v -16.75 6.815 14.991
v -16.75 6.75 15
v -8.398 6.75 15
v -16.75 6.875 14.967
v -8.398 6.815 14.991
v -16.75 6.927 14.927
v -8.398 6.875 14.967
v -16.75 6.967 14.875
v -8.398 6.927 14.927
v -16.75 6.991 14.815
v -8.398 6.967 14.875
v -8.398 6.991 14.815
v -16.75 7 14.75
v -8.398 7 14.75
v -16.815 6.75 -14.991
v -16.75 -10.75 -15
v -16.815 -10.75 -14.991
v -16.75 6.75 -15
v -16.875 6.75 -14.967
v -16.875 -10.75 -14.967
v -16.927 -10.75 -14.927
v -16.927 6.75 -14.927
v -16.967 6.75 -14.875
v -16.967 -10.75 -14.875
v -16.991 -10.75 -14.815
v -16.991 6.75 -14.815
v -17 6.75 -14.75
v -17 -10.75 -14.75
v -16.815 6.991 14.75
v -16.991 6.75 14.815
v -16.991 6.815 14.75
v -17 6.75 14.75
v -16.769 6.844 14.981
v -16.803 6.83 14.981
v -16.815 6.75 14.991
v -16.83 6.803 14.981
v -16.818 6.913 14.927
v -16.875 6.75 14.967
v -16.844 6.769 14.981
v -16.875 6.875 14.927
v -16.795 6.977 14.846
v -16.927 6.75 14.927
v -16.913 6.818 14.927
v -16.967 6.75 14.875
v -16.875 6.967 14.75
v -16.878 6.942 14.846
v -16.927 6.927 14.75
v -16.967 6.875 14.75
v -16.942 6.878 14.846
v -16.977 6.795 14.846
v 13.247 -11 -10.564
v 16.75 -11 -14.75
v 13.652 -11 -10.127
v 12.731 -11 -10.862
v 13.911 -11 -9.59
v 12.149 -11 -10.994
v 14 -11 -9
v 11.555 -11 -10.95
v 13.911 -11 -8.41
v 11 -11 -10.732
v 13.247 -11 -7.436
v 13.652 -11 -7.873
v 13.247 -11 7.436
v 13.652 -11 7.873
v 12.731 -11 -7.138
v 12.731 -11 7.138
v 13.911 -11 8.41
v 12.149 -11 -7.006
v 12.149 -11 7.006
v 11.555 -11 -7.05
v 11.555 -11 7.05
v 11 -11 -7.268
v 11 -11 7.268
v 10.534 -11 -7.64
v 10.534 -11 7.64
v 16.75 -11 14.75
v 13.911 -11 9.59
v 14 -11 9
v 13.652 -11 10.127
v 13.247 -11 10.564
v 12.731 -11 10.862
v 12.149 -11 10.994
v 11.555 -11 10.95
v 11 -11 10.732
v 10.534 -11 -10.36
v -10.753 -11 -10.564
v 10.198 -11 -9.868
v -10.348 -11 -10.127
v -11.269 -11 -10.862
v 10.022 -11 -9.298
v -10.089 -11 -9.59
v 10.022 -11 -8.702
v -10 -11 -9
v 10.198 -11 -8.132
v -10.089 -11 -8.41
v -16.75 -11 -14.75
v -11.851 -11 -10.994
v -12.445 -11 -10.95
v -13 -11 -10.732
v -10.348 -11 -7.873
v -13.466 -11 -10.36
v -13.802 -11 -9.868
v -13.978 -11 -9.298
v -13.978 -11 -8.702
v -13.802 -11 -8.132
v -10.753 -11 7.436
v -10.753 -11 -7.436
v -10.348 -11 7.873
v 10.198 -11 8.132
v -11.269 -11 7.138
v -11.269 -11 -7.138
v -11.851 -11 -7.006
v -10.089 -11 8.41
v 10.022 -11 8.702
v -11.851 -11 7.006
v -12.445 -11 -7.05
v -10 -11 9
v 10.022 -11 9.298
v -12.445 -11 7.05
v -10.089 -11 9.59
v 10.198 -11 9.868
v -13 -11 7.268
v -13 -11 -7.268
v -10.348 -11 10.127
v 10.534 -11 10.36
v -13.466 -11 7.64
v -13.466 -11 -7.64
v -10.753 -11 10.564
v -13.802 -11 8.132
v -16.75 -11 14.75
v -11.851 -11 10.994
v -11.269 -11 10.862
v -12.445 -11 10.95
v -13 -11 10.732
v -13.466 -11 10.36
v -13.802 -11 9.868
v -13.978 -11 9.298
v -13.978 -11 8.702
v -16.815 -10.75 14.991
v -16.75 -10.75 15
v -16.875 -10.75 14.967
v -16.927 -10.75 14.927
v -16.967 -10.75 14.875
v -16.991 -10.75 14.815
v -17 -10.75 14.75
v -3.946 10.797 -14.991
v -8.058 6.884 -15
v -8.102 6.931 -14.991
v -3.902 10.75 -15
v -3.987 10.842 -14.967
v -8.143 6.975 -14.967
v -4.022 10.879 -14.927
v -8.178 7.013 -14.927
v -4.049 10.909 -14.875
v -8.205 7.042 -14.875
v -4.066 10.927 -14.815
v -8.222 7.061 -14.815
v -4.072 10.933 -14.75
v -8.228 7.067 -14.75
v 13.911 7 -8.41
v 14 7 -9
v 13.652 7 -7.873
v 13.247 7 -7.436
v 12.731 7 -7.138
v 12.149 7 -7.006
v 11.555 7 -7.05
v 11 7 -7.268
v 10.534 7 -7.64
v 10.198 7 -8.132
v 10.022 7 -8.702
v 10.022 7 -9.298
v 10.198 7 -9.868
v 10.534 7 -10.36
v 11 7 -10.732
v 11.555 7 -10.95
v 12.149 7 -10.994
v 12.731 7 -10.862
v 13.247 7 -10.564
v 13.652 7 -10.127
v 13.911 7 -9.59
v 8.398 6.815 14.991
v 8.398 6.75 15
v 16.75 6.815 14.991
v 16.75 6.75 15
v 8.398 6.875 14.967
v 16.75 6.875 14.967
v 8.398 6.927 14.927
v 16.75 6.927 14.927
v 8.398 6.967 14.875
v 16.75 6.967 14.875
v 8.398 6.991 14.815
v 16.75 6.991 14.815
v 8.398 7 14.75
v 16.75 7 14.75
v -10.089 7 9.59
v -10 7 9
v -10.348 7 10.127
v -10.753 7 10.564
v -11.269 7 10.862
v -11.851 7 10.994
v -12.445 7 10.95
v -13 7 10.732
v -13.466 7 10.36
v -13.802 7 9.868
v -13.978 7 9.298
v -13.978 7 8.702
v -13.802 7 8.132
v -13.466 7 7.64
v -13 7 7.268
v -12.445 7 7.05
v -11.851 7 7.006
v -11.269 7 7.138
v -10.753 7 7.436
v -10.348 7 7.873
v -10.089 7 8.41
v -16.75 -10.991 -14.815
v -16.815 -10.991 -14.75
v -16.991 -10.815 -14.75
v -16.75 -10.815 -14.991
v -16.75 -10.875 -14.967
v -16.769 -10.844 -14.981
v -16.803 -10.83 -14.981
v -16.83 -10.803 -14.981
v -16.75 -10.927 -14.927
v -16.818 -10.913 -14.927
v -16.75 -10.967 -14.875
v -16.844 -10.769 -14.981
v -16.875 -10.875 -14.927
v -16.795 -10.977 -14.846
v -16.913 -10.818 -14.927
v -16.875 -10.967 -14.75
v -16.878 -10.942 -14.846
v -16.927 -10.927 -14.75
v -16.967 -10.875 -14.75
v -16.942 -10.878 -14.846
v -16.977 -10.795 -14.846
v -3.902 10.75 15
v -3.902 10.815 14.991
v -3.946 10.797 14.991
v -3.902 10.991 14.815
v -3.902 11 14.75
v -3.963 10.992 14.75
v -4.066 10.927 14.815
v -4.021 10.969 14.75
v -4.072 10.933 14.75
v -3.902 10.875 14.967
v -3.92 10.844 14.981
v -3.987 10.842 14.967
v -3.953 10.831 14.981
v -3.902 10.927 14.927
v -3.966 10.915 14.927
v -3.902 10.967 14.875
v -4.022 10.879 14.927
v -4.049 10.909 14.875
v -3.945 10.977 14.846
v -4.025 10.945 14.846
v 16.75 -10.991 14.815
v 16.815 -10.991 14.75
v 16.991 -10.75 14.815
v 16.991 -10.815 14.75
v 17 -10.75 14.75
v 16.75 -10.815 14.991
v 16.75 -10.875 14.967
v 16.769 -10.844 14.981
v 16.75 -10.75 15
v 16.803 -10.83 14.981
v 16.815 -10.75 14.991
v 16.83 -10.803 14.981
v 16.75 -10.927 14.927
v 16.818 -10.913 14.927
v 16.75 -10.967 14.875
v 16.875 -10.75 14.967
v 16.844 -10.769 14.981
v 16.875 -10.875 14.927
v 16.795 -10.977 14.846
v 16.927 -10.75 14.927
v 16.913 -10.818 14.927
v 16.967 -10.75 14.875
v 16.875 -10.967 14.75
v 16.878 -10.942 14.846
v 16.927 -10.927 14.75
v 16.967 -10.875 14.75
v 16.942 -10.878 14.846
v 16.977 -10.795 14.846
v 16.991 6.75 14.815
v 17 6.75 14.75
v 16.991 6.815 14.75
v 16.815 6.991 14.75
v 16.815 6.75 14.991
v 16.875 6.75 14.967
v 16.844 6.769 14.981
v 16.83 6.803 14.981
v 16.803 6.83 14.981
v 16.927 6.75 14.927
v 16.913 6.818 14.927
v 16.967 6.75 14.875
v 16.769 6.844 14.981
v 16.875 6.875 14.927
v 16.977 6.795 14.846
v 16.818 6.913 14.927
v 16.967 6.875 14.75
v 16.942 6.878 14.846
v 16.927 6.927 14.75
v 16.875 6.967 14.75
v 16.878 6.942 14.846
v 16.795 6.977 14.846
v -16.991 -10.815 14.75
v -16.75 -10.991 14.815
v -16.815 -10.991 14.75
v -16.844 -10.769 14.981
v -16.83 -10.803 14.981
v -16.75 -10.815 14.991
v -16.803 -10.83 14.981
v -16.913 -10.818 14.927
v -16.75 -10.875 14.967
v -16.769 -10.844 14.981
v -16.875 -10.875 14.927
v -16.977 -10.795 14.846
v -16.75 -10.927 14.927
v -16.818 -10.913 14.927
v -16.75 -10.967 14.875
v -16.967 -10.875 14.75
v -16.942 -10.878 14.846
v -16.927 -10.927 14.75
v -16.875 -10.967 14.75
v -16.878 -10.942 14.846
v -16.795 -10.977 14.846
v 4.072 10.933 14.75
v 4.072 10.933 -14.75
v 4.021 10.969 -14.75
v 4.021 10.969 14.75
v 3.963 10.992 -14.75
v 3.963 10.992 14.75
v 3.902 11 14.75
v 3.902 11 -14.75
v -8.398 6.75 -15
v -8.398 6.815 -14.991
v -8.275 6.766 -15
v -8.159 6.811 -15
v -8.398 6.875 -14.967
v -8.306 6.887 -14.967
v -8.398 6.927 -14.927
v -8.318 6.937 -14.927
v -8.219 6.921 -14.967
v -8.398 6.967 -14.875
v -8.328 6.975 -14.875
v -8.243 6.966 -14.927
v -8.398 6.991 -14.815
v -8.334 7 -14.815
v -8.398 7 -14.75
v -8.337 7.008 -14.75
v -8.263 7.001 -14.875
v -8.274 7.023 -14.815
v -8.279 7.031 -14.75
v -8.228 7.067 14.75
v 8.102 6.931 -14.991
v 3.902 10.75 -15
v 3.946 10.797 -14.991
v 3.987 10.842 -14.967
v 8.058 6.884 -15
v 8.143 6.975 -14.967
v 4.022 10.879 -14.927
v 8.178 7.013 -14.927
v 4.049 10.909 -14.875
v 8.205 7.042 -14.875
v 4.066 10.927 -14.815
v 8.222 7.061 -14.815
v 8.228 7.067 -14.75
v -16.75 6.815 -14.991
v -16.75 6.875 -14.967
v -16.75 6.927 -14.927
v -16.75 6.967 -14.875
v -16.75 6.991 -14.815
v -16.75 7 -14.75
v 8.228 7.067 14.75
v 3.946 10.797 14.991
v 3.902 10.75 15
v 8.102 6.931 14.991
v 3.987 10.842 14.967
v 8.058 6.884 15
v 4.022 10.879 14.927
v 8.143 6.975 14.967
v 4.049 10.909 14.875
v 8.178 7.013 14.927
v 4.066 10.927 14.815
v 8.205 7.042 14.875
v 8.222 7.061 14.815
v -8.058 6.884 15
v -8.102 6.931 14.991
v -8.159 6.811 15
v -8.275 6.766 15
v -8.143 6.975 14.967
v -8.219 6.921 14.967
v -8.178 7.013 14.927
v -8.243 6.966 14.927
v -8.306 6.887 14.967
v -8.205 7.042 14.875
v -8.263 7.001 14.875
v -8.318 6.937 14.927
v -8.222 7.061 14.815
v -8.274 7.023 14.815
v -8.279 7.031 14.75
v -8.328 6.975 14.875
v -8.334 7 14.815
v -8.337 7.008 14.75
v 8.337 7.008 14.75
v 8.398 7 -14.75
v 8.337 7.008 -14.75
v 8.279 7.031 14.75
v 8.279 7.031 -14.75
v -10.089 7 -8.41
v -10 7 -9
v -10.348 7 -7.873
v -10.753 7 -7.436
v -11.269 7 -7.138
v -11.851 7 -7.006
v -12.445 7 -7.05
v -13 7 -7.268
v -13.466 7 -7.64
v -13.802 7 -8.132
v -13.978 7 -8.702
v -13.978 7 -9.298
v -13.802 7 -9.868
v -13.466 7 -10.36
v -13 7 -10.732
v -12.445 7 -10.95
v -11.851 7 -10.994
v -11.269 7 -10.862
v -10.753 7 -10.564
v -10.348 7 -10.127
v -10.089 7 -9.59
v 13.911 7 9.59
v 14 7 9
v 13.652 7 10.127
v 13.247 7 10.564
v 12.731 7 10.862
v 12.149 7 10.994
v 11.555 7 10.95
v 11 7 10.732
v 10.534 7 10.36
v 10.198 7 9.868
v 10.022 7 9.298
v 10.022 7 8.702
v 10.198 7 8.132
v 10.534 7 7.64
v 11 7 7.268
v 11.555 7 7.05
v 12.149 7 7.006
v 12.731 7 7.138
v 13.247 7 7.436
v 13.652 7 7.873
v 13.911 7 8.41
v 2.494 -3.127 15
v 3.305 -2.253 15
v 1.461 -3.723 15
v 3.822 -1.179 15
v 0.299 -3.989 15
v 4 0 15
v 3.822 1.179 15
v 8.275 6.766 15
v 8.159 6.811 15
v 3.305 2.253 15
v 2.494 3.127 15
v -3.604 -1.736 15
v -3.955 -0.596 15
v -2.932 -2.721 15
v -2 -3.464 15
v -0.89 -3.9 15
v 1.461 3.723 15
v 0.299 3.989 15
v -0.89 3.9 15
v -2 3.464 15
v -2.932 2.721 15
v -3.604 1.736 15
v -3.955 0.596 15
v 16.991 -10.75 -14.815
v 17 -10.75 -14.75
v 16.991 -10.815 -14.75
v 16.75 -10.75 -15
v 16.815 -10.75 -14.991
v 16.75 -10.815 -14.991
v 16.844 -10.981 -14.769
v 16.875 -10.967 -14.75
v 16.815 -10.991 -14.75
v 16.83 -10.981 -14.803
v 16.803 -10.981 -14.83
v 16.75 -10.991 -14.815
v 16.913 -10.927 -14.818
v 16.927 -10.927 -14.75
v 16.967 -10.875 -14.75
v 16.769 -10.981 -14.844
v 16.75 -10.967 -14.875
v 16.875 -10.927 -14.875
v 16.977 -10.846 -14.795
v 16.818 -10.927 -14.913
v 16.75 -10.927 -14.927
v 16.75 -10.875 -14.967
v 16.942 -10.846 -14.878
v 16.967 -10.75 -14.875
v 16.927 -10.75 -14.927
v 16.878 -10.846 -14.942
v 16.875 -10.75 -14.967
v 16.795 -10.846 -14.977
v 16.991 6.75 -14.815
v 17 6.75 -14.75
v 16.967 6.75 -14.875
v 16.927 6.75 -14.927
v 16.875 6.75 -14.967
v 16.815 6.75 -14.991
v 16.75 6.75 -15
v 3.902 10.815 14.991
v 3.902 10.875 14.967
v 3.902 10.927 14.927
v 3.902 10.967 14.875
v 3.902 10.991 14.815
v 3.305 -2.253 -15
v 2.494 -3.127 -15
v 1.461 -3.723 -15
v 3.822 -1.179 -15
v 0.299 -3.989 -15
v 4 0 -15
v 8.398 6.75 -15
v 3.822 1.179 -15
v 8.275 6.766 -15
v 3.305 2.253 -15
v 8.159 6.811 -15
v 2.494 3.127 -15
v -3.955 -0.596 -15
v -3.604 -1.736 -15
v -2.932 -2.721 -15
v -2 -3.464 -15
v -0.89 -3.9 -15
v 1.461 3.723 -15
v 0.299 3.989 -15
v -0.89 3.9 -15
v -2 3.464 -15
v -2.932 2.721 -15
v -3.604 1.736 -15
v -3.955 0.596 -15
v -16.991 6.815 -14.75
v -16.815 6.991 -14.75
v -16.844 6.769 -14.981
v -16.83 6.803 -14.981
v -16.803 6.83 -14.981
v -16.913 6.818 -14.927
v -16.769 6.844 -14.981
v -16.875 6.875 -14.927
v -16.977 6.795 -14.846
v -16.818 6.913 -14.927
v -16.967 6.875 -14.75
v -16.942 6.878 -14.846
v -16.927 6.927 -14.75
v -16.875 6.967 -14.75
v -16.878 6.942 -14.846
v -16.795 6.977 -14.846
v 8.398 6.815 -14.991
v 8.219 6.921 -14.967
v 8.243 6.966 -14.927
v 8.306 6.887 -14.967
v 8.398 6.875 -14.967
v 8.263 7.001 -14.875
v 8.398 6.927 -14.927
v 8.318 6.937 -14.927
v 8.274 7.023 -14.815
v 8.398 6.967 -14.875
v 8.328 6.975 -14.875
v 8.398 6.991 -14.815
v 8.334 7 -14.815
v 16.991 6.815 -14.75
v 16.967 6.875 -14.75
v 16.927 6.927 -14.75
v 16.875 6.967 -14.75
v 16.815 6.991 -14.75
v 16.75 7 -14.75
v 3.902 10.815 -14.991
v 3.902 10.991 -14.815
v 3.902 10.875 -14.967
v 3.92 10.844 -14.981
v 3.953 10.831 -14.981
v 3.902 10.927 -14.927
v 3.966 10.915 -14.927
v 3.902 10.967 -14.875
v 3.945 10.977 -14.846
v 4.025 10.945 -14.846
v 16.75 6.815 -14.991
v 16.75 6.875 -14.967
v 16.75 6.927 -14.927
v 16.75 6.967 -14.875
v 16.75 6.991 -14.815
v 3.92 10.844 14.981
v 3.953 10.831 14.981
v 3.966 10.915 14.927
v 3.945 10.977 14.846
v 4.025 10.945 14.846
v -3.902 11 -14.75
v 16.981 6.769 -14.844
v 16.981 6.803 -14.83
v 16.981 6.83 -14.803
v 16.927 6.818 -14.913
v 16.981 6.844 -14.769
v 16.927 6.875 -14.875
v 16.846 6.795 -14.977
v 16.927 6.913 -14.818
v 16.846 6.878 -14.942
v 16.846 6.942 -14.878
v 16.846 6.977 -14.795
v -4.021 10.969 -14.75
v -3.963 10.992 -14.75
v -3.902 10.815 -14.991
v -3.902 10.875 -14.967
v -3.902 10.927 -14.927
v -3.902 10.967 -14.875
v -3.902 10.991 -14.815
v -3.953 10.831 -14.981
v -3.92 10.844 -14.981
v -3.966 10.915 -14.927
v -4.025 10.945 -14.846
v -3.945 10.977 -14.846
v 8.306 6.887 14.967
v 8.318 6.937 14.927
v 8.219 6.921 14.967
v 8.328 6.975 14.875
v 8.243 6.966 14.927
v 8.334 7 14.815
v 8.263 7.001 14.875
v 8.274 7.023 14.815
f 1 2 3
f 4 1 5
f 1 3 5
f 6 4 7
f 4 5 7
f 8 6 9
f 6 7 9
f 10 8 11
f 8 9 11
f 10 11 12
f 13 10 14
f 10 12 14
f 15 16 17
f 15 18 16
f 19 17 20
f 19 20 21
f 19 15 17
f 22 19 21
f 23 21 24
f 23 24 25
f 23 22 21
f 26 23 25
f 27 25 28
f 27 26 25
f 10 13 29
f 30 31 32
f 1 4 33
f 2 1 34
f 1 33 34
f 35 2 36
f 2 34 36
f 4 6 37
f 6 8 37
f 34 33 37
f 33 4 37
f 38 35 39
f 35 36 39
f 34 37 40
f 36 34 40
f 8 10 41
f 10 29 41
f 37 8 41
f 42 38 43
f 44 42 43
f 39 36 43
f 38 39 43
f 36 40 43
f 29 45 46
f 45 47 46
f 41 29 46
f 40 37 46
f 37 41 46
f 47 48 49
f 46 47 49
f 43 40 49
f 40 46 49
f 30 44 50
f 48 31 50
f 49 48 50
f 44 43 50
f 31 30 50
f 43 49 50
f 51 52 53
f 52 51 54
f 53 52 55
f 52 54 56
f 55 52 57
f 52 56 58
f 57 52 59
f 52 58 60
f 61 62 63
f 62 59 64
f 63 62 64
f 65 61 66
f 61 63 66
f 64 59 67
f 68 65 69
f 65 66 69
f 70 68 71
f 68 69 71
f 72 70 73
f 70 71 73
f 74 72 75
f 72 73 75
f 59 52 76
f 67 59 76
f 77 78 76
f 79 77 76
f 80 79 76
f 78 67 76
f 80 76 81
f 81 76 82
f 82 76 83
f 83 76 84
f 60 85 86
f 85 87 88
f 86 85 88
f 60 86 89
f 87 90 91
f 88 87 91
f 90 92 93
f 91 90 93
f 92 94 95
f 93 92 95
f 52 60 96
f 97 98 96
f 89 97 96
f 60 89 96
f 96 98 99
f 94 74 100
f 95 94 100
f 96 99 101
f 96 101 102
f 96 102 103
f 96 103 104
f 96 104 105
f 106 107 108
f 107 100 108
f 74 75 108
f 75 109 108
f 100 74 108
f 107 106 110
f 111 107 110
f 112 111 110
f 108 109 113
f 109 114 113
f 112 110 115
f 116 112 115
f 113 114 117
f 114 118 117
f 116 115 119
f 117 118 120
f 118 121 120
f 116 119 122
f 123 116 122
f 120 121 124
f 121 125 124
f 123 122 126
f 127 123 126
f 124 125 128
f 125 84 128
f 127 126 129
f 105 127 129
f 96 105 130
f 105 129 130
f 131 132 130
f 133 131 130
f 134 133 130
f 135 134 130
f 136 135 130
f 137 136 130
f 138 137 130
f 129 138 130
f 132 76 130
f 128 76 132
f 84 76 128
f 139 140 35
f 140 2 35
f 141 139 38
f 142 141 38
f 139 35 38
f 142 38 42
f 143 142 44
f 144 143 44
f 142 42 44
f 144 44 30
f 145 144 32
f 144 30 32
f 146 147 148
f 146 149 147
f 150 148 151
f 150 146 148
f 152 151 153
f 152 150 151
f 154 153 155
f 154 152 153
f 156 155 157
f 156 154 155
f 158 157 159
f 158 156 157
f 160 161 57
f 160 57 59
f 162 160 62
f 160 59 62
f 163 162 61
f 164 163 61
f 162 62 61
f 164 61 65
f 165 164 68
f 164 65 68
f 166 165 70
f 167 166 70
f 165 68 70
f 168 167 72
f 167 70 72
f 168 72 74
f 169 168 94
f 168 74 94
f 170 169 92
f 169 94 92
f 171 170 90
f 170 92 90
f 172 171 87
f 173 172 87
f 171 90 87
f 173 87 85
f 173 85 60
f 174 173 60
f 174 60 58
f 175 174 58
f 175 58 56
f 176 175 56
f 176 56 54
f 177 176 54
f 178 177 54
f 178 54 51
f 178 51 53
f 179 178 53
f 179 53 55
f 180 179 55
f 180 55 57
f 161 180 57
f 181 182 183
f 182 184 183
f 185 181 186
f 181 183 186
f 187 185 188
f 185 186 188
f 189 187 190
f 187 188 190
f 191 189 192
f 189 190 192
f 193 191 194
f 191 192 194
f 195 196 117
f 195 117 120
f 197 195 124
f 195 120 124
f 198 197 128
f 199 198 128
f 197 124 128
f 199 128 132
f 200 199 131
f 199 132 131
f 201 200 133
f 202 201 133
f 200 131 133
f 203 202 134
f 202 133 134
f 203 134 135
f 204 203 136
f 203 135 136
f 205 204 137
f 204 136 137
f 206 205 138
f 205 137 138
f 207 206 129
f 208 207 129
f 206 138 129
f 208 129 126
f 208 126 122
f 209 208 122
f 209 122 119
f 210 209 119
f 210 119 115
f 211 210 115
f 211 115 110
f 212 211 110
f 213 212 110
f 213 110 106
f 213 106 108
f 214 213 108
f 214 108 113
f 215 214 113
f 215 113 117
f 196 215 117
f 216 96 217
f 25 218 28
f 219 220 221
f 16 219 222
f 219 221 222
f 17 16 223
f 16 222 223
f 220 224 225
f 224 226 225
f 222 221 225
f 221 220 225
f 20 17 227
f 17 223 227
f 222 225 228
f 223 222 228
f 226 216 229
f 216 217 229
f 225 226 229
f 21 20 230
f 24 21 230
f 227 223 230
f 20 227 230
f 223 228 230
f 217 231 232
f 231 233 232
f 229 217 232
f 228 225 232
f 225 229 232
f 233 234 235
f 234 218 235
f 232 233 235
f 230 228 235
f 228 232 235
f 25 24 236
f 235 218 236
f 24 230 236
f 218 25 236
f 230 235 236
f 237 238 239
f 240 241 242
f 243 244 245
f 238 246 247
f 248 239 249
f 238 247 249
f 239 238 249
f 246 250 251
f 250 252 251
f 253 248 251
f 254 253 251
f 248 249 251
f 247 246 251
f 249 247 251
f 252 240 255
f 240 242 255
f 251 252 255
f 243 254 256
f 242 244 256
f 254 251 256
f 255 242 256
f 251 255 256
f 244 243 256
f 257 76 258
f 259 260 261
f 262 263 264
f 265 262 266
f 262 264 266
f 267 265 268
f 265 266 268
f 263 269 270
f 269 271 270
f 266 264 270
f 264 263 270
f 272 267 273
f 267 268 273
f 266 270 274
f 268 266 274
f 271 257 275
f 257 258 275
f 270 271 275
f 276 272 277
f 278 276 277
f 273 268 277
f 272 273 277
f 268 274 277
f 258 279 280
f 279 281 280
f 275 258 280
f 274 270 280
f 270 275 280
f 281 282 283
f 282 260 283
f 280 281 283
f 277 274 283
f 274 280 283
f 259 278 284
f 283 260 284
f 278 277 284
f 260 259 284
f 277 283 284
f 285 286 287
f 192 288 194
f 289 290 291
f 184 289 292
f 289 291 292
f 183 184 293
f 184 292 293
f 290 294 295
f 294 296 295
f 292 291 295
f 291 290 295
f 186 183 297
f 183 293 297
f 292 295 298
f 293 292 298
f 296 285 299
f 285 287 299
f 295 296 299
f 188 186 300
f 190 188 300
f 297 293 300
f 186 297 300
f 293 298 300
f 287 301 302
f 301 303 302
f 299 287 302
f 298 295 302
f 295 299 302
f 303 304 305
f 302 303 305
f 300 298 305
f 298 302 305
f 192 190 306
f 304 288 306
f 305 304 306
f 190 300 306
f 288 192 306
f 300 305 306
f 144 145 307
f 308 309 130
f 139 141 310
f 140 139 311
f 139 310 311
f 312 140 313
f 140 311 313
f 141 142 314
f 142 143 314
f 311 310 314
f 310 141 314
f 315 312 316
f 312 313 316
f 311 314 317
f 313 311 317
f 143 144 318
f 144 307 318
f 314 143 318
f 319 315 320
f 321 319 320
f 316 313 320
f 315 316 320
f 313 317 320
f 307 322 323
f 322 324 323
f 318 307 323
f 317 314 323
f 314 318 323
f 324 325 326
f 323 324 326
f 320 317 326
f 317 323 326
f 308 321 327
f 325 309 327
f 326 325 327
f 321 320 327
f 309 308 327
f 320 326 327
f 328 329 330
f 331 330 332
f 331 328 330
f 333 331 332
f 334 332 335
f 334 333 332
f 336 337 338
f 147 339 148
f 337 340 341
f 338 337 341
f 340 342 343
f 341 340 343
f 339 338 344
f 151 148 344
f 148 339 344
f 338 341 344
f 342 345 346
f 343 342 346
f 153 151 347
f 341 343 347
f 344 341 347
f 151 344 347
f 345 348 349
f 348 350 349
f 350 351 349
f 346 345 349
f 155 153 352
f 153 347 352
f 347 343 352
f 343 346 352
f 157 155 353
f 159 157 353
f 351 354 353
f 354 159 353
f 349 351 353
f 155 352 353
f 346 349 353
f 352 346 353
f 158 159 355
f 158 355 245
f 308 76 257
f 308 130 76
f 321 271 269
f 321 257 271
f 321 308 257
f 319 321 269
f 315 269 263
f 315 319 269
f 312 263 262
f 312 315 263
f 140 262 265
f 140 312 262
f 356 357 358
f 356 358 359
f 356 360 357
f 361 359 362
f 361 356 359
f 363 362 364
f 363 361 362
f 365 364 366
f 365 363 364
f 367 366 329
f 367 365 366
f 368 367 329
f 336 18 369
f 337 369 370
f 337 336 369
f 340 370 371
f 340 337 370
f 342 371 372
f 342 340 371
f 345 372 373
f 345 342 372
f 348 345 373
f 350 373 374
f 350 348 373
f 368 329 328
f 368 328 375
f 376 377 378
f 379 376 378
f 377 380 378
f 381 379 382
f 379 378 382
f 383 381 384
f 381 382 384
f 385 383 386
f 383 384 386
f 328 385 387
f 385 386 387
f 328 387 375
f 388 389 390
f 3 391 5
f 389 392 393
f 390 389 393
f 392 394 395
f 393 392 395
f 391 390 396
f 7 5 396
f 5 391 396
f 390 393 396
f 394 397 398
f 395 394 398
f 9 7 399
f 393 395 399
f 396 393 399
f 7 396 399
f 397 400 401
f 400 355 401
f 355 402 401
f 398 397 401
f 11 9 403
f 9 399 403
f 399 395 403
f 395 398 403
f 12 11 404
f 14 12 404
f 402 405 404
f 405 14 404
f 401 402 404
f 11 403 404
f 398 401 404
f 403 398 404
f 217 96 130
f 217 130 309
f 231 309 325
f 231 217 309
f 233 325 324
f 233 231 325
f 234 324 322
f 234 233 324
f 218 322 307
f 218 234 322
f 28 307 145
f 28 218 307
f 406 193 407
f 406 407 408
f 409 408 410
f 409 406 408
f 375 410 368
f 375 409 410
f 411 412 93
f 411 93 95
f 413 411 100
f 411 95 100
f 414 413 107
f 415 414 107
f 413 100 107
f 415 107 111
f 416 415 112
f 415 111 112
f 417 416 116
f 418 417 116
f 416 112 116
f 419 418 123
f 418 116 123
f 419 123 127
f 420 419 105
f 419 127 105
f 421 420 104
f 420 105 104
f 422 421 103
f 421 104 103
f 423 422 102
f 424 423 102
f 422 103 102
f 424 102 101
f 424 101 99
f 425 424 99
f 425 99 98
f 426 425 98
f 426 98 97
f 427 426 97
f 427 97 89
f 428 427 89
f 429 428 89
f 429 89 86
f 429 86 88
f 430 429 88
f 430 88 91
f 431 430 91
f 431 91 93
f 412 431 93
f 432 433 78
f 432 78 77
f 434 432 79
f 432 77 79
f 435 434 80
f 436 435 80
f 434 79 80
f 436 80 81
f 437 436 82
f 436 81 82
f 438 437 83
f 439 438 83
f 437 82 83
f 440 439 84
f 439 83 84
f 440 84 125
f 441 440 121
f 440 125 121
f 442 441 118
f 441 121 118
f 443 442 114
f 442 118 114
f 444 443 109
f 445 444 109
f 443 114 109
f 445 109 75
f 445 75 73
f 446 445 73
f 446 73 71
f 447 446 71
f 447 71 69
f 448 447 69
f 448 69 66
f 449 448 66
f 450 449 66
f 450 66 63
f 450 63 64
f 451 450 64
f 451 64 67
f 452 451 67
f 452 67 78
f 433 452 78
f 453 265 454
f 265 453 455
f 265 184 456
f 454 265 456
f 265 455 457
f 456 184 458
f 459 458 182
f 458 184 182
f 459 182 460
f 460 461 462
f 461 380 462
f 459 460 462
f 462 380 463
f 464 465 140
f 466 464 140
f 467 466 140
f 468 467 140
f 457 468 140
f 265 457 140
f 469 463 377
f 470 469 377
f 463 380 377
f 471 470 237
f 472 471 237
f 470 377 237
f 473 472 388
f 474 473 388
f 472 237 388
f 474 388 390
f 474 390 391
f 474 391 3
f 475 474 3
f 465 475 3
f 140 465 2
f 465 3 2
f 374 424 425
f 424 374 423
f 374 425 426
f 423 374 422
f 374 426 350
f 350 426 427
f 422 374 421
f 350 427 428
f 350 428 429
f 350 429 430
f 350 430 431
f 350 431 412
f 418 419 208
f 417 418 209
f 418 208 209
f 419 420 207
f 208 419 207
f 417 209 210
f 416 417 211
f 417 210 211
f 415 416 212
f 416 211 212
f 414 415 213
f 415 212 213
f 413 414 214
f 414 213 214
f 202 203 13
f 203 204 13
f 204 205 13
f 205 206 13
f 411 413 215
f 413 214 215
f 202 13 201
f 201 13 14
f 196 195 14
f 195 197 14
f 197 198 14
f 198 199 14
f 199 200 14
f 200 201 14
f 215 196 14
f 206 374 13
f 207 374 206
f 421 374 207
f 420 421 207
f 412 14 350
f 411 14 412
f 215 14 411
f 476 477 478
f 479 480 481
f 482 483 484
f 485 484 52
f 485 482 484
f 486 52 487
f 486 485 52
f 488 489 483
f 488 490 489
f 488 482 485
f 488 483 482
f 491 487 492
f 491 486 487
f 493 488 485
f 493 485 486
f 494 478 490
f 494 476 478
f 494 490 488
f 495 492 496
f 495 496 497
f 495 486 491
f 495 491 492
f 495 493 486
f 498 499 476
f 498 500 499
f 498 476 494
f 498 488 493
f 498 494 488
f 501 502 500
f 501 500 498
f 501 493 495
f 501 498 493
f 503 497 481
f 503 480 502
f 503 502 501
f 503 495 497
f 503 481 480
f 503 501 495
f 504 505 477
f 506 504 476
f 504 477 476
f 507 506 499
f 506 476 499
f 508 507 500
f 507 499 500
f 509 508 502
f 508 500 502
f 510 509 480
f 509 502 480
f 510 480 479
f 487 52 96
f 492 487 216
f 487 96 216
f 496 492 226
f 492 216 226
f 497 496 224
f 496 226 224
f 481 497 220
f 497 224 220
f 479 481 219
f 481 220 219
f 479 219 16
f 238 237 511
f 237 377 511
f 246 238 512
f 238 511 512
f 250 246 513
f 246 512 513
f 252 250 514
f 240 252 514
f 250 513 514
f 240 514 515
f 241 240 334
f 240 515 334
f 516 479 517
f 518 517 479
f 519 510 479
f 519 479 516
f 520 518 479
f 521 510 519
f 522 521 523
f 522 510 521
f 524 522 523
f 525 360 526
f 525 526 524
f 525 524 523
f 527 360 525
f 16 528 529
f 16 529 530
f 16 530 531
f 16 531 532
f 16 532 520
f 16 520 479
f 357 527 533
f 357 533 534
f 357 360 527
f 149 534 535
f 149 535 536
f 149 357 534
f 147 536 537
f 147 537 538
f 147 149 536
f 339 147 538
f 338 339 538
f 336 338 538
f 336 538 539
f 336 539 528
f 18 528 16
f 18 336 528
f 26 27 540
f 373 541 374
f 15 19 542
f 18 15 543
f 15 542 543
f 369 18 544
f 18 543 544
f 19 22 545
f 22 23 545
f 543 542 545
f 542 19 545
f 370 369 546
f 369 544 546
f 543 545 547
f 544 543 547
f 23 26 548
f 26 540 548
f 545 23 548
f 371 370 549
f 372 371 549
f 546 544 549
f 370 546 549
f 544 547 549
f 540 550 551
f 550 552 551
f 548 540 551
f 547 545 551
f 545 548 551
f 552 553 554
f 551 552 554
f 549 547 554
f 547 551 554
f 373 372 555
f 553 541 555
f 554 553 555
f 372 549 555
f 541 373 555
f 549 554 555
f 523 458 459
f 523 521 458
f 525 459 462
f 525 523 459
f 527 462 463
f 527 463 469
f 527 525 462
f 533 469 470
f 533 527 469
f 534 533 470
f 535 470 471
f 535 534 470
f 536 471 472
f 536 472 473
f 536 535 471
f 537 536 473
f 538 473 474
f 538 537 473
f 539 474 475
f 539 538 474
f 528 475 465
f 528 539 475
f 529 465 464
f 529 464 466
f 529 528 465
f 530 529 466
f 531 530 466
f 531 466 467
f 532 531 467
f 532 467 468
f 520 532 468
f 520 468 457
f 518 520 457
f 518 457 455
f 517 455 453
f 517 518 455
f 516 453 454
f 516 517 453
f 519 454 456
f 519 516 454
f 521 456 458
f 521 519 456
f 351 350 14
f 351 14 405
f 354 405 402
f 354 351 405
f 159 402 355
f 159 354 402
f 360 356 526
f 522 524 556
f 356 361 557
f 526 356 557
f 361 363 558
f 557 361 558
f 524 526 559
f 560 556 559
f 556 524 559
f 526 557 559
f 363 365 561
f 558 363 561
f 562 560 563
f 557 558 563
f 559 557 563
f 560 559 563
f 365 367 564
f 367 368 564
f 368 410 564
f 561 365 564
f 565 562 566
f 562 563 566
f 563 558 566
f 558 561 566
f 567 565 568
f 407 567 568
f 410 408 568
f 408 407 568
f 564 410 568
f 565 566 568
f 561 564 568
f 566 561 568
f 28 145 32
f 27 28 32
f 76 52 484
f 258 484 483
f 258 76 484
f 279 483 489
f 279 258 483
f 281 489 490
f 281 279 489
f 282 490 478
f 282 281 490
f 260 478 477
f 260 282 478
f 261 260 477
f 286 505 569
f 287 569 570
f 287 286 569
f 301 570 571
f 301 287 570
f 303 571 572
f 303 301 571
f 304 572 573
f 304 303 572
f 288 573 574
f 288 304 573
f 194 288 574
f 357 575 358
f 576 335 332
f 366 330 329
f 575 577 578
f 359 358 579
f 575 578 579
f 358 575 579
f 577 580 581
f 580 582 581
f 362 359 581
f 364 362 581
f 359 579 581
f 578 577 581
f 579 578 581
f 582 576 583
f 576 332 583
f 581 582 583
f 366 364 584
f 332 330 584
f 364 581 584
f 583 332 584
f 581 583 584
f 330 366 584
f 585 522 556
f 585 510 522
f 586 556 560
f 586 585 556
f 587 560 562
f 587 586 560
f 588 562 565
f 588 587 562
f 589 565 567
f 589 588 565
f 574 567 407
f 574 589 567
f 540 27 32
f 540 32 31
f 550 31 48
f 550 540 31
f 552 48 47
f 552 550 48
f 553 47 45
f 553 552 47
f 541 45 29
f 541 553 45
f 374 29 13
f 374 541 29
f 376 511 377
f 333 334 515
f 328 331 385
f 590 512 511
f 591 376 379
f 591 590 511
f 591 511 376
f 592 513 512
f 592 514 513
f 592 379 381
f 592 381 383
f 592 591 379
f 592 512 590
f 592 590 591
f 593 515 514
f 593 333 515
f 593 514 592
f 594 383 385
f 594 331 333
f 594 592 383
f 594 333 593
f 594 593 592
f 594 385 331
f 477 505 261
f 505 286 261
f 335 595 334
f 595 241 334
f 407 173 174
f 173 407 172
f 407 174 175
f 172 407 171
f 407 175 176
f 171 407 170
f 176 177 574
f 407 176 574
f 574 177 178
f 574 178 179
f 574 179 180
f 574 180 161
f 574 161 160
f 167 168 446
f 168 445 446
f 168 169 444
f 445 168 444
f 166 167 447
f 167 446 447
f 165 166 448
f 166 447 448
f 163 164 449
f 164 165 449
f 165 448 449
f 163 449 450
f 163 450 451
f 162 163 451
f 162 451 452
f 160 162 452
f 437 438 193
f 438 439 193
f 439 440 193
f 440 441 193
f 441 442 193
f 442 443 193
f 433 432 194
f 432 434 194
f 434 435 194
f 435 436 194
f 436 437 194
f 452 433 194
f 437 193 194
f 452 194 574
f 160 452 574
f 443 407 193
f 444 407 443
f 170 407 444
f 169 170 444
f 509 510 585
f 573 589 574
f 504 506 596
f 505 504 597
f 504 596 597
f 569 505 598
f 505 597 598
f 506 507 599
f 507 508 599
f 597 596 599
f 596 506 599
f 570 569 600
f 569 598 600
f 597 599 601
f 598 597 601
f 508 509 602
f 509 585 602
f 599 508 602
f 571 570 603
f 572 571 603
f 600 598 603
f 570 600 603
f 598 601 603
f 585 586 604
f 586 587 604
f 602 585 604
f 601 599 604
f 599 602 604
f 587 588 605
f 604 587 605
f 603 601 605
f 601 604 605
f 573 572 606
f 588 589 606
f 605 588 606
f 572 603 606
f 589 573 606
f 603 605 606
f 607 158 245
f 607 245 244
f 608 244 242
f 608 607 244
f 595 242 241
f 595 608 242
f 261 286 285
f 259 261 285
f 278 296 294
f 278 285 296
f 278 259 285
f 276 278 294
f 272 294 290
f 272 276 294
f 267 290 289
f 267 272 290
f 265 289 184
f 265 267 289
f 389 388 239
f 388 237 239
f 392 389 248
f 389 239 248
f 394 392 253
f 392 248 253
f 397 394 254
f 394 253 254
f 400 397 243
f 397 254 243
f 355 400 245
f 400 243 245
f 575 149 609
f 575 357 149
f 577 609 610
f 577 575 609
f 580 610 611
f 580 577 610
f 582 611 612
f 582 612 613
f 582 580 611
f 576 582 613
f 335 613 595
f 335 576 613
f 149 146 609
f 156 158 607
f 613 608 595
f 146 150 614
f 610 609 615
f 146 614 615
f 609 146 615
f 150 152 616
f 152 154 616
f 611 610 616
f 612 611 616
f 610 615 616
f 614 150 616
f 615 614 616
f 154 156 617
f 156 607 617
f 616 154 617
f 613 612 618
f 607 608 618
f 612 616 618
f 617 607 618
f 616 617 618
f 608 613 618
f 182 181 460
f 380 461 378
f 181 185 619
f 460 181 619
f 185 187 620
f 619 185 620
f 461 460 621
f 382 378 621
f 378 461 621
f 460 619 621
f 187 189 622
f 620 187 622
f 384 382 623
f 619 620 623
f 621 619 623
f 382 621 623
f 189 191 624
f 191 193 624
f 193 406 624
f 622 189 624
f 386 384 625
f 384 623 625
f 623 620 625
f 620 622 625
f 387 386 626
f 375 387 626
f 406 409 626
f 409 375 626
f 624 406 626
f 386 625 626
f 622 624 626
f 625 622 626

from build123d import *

# Parameters (mm, degrees)
SKETCH1_R           = 4
BOSS_EXTRUDE1_DEPTH = 15
CUT_EXTRUDE1_REACH  = 24
SKETCH2_R           = 2
FILLET1_R           = 0.25


with BuildPart() as part:
    # Sketch1 → Boss-Extrude1 (new body, symmetric)
    with BuildSketch(Plane.XY):
        Polygon((17, -11), (-17, -11), (-17, 7), (-8.3, 7), (-4, 11), (4, 11), (8.3, 7), (17, 7), align=None)
        Circle(SKETCH1_R, mode=Mode.SUBTRACT)
    extrude(amount=BOSS_EXTRUDE1_DEPTH, both=True)

    # Sketch2 → Cut-Extrude1 (cut, up to next)
    with BuildSketch(Plane.XZ.offset(11), mode=Mode.PRIVATE) as cut_extrude1_sk1:
        with Locations((12, 9)):
            Circle(SKETCH2_R)
    cut_extrude1_tool1 = extrude(cut_extrude1_sk1.sketch, amount=-CUT_EXTRUDE1_REACH, mode=Mode.PRIVATE) & part.part
    add(cut_extrude1_tool1.solids().sort_by_distance((12, -11, 9))[0], mode=Mode.SUBTRACT)
    # Sketch2 → Cut-Extrude1 (cut, up to next)
    with BuildSketch(Plane.XZ.offset(11), mode=Mode.PRIVATE) as cut_extrude1_sk2:
        with Locations((-12, 9)):
            Circle(SKETCH2_R)
    cut_extrude1_tool2 = extrude(cut_extrude1_sk2.sketch, amount=-CUT_EXTRUDE1_REACH, mode=Mode.PRIVATE) & part.part
    add(cut_extrude1_tool2.solids().sort_by_distance((-12, -11, 9))[0], mode=Mode.SUBTRACT)
    # Sketch2 → Cut-Extrude1 (cut, up to next)
    with BuildSketch(Plane.XZ.offset(11), mode=Mode.PRIVATE) as cut_extrude1_sk3:
        with Locations((12, -9)):
            Circle(SKETCH2_R)
    cut_extrude1_tool3 = extrude(cut_extrude1_sk3.sketch, amount=-CUT_EXTRUDE1_REACH, mode=Mode.PRIVATE) & part.part
    add(cut_extrude1_tool3.solids().sort_by_distance((12, -11, -9))[0], mode=Mode.SUBTRACT)
    # Sketch2 → Cut-Extrude1 (cut, up to next)
    with BuildSketch(Plane.XZ.offset(11), mode=Mode.PRIVATE) as cut_extrude1_sk4:
        with Locations((-12, -9)):
            Circle(SKETCH2_R)
    cut_extrude1_tool4 = extrude(cut_extrude1_sk4.sketch, amount=-CUT_EXTRUDE1_REACH, mode=Mode.PRIVATE) & part.part
    add(cut_extrude1_tool4.solids().sort_by_distance((-12, -11, -9))[0], mode=Mode.SUBTRACT)

    # Fillet1
    fillet1_edges = [part.edges().sort_by_distance(p)[0] for p in [
        (0, 11, -15),
        (6.15, 9, -15),
        (12.65, 7, -15),
        (17, -2, -15),
        (6.15, 9, 15),
        (17, -11, 0),
        (-17, -11, 0),
        (-17, 7, 0),
        (-8.3, 7, 0),
        (-4, 11, 0),
        (4, 11, 0),
        (8.3, 7, 0),
        (17, 7, 0),
        (0, 11, 15),
        (-6.15, 9, 15),
        (-12.65, 7, 15),
        (-17, -2, 15),
        (0, -11, 15),
        (17, -2, 15),
        (0, -11, -15),
        (12.65, 7, 15),
        (-17, -2, -15),
        (-12.65, 7, -15),
        (-6.15, 9, -15),
    ]]
    fillet(fillet1_edges, radius=FILLET1_R)


solid = part.part
